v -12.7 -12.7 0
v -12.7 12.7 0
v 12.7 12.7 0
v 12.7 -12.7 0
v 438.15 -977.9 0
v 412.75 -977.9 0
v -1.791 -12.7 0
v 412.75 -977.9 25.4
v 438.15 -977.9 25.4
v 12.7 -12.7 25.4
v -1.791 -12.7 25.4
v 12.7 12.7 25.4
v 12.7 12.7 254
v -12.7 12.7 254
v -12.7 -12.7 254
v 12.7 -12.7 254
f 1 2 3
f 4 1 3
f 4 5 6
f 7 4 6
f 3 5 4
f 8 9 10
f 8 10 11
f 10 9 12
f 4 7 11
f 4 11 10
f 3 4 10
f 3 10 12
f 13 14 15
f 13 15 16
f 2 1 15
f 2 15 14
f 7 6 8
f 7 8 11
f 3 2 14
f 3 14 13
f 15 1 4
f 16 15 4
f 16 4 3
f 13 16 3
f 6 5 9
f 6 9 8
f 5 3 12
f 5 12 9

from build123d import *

# Parameters (mm, degrees)
SKETCH1_W           = 25.4
SKETCH1_H           = 25.4
BOSS_EXTRUDE1_DEPTH = 254
BOSS_EXTRUDE2_DEPTH = 25.4


with BuildPart() as part:
    # Sketch1 → Boss-Extrude1 (new body)
    with BuildSketch(Plane.XY):
        Rectangle(SKETCH1_W, SKETCH1_H)
    extrude(amount=BOSS_EXTRUDE1_DEPTH)


with BuildPart() as body_2:
    # Sketch2 → Boss-Extrude2 (new body)
    with BuildSketch(Plane.XY):
        Polygon((12.7, 12.7), (438.15, -977.9), (412.75, -977.9), (-1.791025641, -12.7), (12.7, -12.7), align=None)
    extrude(amount=BOSS_EXTRUDE2_DEPTH)


solid = Compound([part.part, body_2.part])
